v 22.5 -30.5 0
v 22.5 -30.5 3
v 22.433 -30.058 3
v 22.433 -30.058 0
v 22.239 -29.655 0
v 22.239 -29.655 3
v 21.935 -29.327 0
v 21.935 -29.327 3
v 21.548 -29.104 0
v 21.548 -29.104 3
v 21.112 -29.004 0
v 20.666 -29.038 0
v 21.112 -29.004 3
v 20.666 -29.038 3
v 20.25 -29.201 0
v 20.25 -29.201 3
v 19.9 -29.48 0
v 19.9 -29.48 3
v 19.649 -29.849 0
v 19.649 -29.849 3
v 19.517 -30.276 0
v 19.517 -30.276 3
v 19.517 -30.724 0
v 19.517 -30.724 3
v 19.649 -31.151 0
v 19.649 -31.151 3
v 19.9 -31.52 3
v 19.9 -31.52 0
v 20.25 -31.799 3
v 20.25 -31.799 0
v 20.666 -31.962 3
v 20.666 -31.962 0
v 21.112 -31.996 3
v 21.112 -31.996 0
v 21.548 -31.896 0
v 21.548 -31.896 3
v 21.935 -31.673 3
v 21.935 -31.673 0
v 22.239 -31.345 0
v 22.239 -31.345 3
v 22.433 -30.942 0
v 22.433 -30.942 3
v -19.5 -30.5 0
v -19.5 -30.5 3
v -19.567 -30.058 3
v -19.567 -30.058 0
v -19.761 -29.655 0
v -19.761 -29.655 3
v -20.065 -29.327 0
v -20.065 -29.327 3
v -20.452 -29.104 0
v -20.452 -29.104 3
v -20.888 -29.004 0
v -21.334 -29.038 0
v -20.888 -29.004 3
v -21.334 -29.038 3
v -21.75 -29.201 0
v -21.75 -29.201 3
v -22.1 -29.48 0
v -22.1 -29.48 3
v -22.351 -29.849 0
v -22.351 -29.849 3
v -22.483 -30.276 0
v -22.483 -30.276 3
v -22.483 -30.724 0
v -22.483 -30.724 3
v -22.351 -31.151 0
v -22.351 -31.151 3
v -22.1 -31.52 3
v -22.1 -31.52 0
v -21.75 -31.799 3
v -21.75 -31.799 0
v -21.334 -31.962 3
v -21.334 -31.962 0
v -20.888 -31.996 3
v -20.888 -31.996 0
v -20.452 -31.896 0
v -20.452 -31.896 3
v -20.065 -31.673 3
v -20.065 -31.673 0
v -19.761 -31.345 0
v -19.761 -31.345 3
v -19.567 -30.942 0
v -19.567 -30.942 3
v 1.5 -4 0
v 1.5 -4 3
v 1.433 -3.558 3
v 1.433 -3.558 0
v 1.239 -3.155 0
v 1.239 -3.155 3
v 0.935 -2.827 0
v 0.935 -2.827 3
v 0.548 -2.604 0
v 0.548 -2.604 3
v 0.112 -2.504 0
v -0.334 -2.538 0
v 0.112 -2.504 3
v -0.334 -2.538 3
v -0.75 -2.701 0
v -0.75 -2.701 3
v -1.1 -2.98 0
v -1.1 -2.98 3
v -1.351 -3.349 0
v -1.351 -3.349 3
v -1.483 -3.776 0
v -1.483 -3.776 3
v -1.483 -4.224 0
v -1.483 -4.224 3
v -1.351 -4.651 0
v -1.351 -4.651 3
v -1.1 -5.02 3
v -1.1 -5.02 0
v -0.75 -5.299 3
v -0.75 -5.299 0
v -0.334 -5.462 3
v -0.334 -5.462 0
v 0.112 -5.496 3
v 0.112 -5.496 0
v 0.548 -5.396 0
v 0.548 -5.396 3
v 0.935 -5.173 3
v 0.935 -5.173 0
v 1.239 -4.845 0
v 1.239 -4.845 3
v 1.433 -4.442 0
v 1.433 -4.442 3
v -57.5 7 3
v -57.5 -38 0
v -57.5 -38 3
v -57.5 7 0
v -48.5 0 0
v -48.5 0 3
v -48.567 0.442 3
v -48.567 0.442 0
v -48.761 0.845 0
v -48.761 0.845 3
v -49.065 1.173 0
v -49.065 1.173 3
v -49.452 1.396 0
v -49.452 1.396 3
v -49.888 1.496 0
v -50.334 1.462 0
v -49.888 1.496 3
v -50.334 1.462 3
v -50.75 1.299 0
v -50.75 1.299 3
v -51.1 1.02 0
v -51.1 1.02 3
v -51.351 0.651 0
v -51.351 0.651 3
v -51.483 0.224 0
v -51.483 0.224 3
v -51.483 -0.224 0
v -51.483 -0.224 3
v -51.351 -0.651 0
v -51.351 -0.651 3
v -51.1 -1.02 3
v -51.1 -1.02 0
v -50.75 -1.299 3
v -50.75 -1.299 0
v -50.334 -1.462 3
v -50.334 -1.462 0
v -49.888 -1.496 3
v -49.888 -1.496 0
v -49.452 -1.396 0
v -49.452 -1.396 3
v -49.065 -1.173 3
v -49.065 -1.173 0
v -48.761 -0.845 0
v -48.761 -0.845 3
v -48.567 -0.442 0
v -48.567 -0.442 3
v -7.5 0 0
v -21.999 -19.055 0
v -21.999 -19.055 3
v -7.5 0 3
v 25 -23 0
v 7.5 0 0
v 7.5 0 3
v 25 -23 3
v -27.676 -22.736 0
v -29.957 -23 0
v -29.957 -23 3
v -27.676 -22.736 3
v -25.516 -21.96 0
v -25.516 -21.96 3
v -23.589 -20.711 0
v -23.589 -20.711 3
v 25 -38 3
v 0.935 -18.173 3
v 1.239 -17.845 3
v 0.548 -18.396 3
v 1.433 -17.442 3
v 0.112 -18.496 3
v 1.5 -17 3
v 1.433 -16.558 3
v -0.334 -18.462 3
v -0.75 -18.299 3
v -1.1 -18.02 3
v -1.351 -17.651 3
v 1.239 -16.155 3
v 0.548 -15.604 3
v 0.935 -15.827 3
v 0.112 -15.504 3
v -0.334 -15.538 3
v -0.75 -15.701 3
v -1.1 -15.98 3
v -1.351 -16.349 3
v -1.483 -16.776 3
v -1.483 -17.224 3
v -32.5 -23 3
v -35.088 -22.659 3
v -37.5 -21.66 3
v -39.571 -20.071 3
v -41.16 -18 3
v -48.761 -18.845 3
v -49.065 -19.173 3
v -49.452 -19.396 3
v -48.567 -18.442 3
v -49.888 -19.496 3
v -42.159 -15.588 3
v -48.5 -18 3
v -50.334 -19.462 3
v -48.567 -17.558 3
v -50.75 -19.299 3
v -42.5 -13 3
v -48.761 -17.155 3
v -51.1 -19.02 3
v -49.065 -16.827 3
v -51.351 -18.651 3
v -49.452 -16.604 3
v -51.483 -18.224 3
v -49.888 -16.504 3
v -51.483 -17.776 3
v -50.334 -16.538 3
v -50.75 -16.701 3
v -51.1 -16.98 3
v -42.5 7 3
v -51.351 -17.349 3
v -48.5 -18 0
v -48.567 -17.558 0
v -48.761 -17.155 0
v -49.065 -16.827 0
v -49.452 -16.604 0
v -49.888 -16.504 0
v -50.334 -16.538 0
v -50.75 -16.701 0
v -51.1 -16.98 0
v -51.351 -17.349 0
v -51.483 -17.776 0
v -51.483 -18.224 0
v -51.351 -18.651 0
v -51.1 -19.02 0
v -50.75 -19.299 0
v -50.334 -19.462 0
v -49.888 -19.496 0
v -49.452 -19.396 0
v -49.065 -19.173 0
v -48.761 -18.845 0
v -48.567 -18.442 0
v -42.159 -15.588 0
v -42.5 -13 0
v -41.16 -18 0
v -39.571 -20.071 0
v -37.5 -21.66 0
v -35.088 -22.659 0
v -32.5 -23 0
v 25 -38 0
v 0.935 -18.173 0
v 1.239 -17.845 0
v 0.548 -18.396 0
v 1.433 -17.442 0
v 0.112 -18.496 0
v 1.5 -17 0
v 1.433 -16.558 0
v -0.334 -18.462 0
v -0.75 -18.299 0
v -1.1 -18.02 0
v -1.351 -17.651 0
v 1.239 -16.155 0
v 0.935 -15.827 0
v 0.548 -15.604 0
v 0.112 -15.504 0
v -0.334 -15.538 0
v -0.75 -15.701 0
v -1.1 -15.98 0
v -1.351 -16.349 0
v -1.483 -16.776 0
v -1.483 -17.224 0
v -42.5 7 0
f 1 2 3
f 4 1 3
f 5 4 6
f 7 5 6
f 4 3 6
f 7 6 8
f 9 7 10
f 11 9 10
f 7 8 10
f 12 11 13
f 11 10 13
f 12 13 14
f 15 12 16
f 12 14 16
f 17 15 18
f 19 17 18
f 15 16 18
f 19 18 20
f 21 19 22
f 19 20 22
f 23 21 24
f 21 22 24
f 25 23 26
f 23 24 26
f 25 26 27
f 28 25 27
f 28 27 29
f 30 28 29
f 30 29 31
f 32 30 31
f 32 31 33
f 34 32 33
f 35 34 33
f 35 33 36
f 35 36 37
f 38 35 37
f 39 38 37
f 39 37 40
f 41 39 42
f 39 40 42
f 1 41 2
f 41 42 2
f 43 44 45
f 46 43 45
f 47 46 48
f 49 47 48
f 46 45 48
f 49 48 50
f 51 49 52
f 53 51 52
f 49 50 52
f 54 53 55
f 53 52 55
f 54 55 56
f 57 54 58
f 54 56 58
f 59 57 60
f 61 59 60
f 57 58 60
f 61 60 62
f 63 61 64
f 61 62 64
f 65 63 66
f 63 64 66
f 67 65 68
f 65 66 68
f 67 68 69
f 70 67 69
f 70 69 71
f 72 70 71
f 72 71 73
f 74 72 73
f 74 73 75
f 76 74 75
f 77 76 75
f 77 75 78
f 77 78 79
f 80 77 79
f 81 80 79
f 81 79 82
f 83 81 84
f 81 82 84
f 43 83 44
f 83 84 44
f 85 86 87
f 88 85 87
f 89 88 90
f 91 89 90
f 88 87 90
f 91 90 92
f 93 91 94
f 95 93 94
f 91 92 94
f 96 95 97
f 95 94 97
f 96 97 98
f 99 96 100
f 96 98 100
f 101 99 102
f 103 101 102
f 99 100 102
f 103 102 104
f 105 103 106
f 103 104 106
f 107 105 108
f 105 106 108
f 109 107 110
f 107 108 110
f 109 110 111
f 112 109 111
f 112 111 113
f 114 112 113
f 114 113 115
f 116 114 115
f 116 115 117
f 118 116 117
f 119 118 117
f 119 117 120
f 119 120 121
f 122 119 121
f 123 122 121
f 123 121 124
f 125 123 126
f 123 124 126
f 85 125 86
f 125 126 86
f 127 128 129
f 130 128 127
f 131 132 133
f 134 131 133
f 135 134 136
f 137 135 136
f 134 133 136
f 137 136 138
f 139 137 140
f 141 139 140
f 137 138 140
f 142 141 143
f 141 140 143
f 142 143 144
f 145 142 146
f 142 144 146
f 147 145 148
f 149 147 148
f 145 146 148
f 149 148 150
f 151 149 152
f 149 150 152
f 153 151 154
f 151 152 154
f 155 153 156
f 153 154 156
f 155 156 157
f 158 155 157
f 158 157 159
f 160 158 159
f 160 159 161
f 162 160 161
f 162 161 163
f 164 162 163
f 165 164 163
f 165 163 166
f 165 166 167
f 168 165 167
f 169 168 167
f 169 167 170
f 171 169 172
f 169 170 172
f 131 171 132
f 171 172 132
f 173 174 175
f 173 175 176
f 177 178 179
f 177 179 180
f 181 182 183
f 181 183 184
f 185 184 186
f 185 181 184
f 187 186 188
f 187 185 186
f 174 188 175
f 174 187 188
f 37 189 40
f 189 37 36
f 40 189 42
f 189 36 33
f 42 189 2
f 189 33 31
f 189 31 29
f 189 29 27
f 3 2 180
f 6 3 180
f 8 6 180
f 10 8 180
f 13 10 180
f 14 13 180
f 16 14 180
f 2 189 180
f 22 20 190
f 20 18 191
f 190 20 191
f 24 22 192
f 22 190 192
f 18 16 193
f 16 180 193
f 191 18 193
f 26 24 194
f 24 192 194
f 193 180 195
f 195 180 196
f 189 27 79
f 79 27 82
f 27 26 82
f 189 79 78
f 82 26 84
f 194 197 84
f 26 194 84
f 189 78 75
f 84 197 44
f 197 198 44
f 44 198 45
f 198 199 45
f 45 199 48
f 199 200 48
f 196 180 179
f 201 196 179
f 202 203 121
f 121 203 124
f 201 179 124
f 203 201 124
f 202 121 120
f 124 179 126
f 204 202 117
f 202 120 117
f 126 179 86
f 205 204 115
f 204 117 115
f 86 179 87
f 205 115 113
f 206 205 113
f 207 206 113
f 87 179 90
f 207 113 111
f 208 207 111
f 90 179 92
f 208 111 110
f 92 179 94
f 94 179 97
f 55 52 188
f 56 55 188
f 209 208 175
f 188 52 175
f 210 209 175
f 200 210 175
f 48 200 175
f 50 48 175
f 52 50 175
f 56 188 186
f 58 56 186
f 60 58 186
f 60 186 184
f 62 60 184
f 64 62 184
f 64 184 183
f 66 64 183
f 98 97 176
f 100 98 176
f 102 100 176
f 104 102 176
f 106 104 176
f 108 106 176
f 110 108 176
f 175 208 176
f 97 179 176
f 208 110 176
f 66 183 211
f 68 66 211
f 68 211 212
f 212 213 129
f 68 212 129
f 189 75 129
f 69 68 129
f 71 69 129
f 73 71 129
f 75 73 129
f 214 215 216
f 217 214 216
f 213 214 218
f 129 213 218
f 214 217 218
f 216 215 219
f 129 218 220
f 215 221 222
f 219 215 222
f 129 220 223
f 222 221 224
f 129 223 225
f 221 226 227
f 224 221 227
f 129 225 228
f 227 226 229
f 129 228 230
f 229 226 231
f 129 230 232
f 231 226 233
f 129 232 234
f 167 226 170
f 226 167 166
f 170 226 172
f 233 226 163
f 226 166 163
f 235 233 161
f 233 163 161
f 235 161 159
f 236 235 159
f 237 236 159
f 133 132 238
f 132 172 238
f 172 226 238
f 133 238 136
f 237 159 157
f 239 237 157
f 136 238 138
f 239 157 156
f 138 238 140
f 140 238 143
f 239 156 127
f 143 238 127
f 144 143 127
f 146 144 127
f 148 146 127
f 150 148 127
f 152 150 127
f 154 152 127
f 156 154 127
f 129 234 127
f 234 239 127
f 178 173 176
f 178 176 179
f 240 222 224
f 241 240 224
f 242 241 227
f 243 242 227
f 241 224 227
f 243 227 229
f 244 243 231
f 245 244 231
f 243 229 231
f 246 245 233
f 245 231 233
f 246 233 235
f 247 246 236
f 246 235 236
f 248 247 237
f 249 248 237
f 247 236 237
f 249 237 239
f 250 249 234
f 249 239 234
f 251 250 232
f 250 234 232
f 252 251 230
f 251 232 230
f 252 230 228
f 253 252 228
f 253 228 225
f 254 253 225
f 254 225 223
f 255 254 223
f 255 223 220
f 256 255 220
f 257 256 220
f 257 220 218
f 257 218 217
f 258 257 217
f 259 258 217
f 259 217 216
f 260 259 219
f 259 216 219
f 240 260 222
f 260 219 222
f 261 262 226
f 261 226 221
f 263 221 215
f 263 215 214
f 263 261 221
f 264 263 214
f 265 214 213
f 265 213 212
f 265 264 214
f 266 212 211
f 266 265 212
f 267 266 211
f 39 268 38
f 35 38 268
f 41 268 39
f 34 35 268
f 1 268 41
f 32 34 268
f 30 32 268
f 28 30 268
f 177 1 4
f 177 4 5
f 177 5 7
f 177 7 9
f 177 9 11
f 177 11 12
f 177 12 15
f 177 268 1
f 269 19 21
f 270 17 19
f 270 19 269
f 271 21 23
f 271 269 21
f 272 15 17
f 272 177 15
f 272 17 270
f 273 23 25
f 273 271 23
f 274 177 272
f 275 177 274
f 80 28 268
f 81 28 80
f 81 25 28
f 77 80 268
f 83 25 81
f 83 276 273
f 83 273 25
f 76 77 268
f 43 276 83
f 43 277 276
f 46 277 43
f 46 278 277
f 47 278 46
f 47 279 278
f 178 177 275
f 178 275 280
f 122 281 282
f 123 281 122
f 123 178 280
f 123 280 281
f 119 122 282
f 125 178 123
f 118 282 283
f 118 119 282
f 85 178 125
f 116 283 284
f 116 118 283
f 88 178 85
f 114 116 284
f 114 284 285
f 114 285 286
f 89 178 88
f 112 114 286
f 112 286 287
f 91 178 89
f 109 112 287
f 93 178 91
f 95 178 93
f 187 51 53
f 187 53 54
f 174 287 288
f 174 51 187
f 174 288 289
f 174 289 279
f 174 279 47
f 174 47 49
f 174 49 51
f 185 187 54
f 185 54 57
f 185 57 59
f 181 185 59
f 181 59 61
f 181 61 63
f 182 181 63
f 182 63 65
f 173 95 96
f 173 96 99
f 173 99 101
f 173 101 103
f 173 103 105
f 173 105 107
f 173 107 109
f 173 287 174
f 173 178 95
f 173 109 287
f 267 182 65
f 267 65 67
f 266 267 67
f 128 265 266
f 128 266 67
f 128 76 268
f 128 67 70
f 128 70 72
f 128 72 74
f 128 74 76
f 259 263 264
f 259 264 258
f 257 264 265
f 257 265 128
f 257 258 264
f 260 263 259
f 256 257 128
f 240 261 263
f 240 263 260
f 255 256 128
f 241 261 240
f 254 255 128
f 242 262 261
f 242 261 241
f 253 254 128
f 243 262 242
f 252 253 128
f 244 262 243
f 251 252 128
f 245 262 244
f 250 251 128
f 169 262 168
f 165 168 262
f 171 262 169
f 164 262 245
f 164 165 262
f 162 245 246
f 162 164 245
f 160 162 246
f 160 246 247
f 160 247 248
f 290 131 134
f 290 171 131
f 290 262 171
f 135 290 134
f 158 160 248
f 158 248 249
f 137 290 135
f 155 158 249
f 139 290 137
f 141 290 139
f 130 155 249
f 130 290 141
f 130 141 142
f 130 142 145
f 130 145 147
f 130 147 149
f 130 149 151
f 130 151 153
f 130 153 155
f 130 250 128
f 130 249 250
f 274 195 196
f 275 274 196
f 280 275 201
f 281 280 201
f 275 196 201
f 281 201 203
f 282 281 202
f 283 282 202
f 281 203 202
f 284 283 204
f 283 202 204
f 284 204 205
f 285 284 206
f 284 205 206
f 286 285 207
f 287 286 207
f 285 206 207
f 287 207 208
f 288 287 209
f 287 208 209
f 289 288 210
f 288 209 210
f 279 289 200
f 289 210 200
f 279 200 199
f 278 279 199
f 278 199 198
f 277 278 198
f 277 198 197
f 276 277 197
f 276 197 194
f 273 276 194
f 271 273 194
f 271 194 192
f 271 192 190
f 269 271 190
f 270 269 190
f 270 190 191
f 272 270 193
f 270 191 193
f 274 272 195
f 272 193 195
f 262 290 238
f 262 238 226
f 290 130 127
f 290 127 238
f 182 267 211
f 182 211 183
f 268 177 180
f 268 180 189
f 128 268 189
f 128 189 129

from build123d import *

# Parameters (mm, degrees)
EXTRUDE_1_DEPTH     = 3
SKETCH_2_R          = 1.5
CUT_EXTRUDE_1_DEPTH = 3


with BuildPart() as part:
    # 草图1 → 凸台-拉伸1 (new body)
    with BuildSketch(Plane.XY):
        with BuildLine():
            Line((-7.5, 0), (7.5, 0))
            Line((7.5, 0), (25, -23))
            Line((25, -23), (25, -38))
            Line((25, -38), (-25, -38))
            Line((-25, -38), (-57.5, -38))
            Line((-57.5, -38), (-57.5, 7))
            Line((-57.5, 7), (-42.5, 7))
            Line((-42.5, 7), (-42.5, -13))
            ThreePointArc((-42.5, -13), (-39.571067812, -20.071067812), (-32.5, -23))
            Line((-32.5, -23), (-29.956822623, -23))
            ThreePointArc((-29.956822623, -23), (-25.515661922, -21.959692608), (-21.998535682, -19.055218325))
            Line((-21.998535682, -19.055218325), (-7.5, 0))
        make_face()
    extrude(amount=EXTRUDE_1_DEPTH)

    # 草图2 → 切除-拉伸1 (cut)
    with BuildSketch(Plane.XY.offset(3)):
        with Locations((0, -4)):
            Circle(SKETCH_2_R)
        with Locations((0, -17)):
            Circle(SKETCH_2_R)
        with Locations((-21, -30.5)):
            Circle(SKETCH_2_R)
        with Locations((21, -30.5)):
            Circle(SKETCH_2_R)
        with Locations((-50, 0)):
            Circle(SKETCH_2_R)
        with Locations((-50, -18)):
            Circle(SKETCH_2_R)
    extrude(amount=-CUT_EXTRUDE_1_DEPTH, mode=Mode.SUBTRACT)


solid = part.part
